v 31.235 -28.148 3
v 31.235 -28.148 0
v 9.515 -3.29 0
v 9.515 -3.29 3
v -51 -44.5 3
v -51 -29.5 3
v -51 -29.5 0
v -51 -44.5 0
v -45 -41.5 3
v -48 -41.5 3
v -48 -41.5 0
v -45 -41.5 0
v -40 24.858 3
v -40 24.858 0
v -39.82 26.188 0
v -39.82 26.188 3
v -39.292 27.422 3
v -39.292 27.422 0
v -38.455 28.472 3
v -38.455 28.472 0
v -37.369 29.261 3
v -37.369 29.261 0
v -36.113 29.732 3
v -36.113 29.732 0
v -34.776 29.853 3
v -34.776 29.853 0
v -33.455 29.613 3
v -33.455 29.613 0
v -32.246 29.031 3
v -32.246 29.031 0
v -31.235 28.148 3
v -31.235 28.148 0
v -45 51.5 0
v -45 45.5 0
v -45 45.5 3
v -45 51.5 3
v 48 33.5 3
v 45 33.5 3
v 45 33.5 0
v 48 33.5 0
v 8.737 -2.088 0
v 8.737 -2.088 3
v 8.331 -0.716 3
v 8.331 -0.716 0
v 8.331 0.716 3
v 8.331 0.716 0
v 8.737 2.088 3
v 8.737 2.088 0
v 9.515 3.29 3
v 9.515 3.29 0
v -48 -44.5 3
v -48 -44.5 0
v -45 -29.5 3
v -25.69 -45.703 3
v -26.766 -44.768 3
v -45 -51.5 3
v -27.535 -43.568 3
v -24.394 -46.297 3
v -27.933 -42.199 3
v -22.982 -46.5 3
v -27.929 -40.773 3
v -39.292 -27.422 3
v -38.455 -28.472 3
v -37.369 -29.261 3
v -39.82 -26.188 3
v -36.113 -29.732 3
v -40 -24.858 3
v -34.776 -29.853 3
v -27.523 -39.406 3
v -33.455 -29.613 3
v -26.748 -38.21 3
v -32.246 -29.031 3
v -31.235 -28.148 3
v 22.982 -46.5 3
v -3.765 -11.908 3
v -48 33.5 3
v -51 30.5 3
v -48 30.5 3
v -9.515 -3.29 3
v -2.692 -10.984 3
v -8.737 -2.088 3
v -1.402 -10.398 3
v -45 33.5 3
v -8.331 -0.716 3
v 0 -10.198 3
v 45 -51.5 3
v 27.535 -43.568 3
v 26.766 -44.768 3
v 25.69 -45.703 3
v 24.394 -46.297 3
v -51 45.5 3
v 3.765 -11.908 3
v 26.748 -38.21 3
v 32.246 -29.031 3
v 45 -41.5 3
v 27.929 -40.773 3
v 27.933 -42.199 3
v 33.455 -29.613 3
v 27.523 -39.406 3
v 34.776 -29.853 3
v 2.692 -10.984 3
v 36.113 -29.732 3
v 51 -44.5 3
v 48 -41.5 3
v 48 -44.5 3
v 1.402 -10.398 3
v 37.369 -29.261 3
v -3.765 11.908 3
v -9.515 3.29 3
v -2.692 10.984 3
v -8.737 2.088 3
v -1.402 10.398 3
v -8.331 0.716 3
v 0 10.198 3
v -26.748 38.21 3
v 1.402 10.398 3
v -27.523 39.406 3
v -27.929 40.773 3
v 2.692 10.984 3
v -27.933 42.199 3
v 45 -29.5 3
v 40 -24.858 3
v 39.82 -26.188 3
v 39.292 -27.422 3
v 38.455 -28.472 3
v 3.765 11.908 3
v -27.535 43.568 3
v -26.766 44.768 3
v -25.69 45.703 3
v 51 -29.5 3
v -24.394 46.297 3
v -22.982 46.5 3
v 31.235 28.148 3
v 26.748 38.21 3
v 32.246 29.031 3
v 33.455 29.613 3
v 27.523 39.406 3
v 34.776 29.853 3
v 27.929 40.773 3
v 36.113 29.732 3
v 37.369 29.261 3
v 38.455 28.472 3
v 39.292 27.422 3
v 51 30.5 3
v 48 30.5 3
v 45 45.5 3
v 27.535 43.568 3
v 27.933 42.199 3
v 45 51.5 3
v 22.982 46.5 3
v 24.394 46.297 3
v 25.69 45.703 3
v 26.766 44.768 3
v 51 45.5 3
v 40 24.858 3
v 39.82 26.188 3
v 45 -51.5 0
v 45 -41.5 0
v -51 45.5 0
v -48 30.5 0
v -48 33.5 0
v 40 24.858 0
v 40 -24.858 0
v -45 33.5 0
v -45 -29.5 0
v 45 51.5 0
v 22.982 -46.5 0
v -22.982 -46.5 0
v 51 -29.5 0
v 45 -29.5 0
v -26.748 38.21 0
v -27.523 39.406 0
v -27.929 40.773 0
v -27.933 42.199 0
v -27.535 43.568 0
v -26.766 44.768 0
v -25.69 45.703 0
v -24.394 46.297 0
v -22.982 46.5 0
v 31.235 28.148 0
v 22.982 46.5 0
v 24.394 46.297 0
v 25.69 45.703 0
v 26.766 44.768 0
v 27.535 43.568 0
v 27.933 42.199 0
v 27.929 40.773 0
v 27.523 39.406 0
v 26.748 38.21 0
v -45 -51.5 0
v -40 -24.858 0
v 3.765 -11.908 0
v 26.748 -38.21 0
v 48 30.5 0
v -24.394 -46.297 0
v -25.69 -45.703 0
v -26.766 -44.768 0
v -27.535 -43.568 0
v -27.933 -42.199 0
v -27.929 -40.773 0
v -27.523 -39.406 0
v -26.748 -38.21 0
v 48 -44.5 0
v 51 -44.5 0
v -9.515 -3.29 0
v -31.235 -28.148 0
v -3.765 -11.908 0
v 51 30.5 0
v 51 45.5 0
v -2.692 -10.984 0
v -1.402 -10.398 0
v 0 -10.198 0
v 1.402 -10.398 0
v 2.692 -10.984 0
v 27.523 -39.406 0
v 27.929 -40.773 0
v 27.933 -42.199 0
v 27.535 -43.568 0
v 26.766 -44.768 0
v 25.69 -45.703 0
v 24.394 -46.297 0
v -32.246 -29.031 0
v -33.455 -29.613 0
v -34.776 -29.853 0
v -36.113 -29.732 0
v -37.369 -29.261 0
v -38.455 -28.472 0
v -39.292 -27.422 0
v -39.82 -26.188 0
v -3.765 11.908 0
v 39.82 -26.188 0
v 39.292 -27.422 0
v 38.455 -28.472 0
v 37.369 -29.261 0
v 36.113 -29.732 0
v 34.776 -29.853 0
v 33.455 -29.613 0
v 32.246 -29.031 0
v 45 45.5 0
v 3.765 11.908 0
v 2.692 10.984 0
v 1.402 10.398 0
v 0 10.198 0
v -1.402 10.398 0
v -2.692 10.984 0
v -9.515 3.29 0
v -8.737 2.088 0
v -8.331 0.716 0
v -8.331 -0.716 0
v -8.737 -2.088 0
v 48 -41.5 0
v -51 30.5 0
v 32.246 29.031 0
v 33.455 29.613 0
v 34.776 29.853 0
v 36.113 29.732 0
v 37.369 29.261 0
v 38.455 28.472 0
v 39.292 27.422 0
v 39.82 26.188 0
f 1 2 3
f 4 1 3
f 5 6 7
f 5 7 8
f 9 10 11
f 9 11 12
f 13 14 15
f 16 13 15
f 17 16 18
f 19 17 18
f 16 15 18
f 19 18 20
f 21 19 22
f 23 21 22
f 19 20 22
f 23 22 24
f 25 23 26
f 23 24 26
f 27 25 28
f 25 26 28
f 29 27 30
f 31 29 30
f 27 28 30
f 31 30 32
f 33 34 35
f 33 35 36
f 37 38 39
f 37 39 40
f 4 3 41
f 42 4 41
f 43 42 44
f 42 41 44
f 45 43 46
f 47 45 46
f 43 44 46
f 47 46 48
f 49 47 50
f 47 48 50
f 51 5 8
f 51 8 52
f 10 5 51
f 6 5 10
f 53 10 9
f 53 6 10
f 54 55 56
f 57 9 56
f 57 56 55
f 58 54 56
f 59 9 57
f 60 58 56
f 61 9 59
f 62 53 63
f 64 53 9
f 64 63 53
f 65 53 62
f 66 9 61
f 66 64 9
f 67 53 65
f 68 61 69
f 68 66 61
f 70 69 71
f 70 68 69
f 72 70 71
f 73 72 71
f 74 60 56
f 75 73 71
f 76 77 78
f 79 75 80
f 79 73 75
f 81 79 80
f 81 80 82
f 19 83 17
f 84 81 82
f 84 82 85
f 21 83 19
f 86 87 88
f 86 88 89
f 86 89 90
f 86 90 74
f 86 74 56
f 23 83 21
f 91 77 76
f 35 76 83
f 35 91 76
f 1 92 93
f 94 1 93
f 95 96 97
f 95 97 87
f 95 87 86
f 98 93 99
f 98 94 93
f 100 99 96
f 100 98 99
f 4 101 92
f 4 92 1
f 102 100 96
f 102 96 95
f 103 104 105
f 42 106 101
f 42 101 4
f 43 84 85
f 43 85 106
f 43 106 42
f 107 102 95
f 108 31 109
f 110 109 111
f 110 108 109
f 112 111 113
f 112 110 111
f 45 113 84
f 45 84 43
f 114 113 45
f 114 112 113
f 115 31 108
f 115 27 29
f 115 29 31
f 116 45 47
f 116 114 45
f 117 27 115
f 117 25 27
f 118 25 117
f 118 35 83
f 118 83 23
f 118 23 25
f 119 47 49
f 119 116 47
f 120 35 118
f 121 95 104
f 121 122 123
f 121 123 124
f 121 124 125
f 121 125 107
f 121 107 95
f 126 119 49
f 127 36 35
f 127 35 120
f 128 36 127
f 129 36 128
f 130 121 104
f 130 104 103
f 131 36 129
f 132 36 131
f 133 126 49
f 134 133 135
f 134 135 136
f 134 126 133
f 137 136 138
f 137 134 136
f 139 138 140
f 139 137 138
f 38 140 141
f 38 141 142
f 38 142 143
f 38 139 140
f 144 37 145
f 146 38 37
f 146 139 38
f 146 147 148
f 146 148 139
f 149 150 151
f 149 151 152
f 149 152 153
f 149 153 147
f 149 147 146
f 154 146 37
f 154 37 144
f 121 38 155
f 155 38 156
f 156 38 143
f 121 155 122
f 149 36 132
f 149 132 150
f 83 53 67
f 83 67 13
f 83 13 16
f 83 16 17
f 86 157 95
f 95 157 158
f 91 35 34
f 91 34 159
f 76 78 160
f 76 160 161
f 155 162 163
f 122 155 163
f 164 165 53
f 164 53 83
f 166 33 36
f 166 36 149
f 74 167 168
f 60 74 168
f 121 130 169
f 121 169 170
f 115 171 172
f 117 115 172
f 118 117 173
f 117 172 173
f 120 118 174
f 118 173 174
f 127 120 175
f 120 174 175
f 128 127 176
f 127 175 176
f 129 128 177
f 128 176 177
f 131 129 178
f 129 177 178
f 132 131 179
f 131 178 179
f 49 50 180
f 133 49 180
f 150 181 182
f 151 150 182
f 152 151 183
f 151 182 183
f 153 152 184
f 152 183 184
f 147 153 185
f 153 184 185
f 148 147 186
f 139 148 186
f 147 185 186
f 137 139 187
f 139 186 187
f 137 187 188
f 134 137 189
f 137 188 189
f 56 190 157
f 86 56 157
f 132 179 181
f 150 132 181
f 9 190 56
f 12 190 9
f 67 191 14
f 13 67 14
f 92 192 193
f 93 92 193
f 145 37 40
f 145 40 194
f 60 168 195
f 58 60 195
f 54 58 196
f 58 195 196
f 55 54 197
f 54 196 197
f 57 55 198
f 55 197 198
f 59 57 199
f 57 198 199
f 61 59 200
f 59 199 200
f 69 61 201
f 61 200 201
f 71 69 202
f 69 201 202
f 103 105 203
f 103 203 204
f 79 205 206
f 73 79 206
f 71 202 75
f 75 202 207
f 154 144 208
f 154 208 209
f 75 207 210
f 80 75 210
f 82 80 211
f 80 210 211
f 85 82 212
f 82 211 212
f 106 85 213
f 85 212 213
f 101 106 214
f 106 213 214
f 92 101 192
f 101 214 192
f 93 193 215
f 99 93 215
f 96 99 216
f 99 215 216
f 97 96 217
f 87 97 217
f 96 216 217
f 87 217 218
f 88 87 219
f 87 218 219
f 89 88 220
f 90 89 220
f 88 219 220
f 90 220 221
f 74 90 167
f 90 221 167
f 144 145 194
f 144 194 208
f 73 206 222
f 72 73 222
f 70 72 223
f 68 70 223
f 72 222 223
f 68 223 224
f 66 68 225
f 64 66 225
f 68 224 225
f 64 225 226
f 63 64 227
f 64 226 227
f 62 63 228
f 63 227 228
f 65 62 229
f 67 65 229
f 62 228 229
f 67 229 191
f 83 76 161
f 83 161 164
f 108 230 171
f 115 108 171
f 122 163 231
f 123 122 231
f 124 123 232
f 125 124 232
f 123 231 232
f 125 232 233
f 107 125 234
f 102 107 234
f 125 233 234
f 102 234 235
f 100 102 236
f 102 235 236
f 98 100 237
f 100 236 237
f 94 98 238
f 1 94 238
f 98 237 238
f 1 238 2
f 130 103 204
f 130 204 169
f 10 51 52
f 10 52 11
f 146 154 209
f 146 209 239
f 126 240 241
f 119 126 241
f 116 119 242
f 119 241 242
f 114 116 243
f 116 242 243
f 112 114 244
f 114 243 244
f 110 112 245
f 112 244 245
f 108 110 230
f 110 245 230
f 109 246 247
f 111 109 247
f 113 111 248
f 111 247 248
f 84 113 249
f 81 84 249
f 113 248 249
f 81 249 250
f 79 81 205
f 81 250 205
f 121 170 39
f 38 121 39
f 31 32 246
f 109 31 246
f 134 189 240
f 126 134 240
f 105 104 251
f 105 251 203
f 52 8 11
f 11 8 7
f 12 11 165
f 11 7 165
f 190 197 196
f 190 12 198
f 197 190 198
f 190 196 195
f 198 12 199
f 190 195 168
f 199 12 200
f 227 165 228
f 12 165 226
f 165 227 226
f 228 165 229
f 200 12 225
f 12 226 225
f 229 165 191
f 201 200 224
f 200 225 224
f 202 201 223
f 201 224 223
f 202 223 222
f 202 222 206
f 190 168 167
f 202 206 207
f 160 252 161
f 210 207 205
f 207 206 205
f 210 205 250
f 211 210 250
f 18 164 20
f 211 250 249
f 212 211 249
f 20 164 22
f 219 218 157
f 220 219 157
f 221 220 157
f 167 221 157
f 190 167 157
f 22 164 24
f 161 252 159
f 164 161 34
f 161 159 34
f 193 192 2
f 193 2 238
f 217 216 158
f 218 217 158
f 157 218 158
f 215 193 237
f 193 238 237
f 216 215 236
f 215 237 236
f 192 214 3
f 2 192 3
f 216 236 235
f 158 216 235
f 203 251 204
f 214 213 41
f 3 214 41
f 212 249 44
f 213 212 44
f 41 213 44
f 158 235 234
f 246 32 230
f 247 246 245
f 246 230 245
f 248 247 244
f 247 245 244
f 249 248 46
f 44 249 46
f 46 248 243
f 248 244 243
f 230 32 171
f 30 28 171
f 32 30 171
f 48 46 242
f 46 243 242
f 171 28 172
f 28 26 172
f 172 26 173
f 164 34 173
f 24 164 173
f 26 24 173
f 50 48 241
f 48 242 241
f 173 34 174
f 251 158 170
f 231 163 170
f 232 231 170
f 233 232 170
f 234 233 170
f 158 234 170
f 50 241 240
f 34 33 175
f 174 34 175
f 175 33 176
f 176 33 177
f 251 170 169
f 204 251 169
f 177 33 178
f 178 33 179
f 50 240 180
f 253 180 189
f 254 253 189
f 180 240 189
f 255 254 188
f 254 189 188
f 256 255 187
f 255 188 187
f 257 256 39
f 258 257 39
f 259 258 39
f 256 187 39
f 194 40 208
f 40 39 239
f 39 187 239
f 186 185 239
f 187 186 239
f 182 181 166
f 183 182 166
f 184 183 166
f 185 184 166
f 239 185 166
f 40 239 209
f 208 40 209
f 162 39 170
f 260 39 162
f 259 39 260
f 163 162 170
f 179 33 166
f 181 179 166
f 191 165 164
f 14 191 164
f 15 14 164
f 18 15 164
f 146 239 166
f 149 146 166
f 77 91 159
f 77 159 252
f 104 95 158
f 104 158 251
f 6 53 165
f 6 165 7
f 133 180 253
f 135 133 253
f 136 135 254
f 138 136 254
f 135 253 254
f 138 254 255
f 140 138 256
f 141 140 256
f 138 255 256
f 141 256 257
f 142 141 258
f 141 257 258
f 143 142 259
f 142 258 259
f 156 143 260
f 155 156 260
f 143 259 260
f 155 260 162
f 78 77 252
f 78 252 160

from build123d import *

# Parameters (mm, degrees)
F0_W     = 90
F0_H     = 103
F1_DEPTH = 3
F3_DEPTH = 3


with BuildPart() as f1:
    # F0 (on Top) → F1 (new body)
    with BuildSketch(Plane.XY):
        Rectangle(F0_W, F0_H)
        with BuildLine():
            ThreePointArc((-22.982442, -46.499999), (-27.534895, -43.567646), (-26.747589, -38.210065))
            Line((-26.747589, -38.210065), (-3.765147, -11.907937))
            ThreePointArc((-3.765147, -11.907937), (0, -10.197872), (3.765147, -11.907937))
            Line((3.765147, -11.907937), (26.747588, -38.210065))
            ThreePointArc((26.747588, -38.210065), (27.534895, -43.567646), (22.982441, -46.499999))
            Line((22.982441, -46.499999), (-22.982442, -46.499999))
        make_face(mode=Mode.SUBTRACT)
        with BuildLine():
            ThreePointArc((-40, 24.857684), (-36.757024, 29.538802), (-31.234853, 28.147618))
            Line((-31.234853, 28.147618), (-9.514547, 3.289934))
            ThreePointArc((-9.514547, 3.289934), (-8.279694, 0), (-9.514547, -3.289934))
            Line((-9.514547, -3.289934), (-31.234853, -28.147618))
            ThreePointArc((-31.234853, -28.147618), (-36.757024, -29.538802), (-40, -24.857684))
            Line((-40, -24.857684), (-40, 24.857684))
        make_face(mode=Mode.SUBTRACT)
        with BuildLine():
            Line((9.514547, 3.289934), (31.234853, 28.147618))
            ThreePointArc((31.234853, 28.147618), (36.757024, 29.538802), (40, 24.857684))
            Line((40, 24.857684), (40, -24.857684))
            ThreePointArc((40, -24.857684), (36.757024, -29.538802), (31.234853, -28.147618))
            Line((31.234853, -28.147618), (9.514547, -3.289934))
            ThreePointArc((9.514547, -3.289934), (8.279694, 0), (9.514547, 3.289934))
        make_face(mode=Mode.SUBTRACT)
        with BuildLine():
            ThreePointArc((22.982441, 46.499999), (27.534895, 43.567646), (26.747588, 38.210065))
            Line((26.747588, 38.210065), (3.765147, 11.907937))
            ThreePointArc((3.765147, 11.907937), (0, 10.197872), (-3.765147, 11.907937))
            Line((-3.765147, 11.907937), (-26.747589, 38.210065))
            ThreePointArc((-26.747589, 38.210065), (-27.534895, 43.567646), (-22.982442, 46.499999))
            Line((-22.982442, 46.499999), (22.982441, 46.499999))
        make_face(mode=Mode.SUBTRACT)
    extrude(amount=F1_DEPTH)

    # F2 (on face) → F3 (join, through all)
    with BuildSketch(Plane.XY.offset(3)):
        Polygon((-45, 33.5), (-45, 45.5), (-51, 45.5), (-51, 30.5), (-48, 30.5), (-48, 33.5), align=None)
        Polygon((51, 45.5), (45, 45.5), (45, 33.5), (48, 33.5), (48, 30.5), (51, 30.5), align=None)
        Polygon((51, -29.5), (45, -29.5), (45, -41.5), (48, -41.5), (48, -44.5), (51, -44.5), align=None)
        Polygon((-45, -41.5), (-45, -29.5), (-51, -29.5), (-51, -44.5), (-48, -44.5), (-48, -41.5), align=None)
    extrude(amount=-F3_DEPTH)


solid = f1.part
